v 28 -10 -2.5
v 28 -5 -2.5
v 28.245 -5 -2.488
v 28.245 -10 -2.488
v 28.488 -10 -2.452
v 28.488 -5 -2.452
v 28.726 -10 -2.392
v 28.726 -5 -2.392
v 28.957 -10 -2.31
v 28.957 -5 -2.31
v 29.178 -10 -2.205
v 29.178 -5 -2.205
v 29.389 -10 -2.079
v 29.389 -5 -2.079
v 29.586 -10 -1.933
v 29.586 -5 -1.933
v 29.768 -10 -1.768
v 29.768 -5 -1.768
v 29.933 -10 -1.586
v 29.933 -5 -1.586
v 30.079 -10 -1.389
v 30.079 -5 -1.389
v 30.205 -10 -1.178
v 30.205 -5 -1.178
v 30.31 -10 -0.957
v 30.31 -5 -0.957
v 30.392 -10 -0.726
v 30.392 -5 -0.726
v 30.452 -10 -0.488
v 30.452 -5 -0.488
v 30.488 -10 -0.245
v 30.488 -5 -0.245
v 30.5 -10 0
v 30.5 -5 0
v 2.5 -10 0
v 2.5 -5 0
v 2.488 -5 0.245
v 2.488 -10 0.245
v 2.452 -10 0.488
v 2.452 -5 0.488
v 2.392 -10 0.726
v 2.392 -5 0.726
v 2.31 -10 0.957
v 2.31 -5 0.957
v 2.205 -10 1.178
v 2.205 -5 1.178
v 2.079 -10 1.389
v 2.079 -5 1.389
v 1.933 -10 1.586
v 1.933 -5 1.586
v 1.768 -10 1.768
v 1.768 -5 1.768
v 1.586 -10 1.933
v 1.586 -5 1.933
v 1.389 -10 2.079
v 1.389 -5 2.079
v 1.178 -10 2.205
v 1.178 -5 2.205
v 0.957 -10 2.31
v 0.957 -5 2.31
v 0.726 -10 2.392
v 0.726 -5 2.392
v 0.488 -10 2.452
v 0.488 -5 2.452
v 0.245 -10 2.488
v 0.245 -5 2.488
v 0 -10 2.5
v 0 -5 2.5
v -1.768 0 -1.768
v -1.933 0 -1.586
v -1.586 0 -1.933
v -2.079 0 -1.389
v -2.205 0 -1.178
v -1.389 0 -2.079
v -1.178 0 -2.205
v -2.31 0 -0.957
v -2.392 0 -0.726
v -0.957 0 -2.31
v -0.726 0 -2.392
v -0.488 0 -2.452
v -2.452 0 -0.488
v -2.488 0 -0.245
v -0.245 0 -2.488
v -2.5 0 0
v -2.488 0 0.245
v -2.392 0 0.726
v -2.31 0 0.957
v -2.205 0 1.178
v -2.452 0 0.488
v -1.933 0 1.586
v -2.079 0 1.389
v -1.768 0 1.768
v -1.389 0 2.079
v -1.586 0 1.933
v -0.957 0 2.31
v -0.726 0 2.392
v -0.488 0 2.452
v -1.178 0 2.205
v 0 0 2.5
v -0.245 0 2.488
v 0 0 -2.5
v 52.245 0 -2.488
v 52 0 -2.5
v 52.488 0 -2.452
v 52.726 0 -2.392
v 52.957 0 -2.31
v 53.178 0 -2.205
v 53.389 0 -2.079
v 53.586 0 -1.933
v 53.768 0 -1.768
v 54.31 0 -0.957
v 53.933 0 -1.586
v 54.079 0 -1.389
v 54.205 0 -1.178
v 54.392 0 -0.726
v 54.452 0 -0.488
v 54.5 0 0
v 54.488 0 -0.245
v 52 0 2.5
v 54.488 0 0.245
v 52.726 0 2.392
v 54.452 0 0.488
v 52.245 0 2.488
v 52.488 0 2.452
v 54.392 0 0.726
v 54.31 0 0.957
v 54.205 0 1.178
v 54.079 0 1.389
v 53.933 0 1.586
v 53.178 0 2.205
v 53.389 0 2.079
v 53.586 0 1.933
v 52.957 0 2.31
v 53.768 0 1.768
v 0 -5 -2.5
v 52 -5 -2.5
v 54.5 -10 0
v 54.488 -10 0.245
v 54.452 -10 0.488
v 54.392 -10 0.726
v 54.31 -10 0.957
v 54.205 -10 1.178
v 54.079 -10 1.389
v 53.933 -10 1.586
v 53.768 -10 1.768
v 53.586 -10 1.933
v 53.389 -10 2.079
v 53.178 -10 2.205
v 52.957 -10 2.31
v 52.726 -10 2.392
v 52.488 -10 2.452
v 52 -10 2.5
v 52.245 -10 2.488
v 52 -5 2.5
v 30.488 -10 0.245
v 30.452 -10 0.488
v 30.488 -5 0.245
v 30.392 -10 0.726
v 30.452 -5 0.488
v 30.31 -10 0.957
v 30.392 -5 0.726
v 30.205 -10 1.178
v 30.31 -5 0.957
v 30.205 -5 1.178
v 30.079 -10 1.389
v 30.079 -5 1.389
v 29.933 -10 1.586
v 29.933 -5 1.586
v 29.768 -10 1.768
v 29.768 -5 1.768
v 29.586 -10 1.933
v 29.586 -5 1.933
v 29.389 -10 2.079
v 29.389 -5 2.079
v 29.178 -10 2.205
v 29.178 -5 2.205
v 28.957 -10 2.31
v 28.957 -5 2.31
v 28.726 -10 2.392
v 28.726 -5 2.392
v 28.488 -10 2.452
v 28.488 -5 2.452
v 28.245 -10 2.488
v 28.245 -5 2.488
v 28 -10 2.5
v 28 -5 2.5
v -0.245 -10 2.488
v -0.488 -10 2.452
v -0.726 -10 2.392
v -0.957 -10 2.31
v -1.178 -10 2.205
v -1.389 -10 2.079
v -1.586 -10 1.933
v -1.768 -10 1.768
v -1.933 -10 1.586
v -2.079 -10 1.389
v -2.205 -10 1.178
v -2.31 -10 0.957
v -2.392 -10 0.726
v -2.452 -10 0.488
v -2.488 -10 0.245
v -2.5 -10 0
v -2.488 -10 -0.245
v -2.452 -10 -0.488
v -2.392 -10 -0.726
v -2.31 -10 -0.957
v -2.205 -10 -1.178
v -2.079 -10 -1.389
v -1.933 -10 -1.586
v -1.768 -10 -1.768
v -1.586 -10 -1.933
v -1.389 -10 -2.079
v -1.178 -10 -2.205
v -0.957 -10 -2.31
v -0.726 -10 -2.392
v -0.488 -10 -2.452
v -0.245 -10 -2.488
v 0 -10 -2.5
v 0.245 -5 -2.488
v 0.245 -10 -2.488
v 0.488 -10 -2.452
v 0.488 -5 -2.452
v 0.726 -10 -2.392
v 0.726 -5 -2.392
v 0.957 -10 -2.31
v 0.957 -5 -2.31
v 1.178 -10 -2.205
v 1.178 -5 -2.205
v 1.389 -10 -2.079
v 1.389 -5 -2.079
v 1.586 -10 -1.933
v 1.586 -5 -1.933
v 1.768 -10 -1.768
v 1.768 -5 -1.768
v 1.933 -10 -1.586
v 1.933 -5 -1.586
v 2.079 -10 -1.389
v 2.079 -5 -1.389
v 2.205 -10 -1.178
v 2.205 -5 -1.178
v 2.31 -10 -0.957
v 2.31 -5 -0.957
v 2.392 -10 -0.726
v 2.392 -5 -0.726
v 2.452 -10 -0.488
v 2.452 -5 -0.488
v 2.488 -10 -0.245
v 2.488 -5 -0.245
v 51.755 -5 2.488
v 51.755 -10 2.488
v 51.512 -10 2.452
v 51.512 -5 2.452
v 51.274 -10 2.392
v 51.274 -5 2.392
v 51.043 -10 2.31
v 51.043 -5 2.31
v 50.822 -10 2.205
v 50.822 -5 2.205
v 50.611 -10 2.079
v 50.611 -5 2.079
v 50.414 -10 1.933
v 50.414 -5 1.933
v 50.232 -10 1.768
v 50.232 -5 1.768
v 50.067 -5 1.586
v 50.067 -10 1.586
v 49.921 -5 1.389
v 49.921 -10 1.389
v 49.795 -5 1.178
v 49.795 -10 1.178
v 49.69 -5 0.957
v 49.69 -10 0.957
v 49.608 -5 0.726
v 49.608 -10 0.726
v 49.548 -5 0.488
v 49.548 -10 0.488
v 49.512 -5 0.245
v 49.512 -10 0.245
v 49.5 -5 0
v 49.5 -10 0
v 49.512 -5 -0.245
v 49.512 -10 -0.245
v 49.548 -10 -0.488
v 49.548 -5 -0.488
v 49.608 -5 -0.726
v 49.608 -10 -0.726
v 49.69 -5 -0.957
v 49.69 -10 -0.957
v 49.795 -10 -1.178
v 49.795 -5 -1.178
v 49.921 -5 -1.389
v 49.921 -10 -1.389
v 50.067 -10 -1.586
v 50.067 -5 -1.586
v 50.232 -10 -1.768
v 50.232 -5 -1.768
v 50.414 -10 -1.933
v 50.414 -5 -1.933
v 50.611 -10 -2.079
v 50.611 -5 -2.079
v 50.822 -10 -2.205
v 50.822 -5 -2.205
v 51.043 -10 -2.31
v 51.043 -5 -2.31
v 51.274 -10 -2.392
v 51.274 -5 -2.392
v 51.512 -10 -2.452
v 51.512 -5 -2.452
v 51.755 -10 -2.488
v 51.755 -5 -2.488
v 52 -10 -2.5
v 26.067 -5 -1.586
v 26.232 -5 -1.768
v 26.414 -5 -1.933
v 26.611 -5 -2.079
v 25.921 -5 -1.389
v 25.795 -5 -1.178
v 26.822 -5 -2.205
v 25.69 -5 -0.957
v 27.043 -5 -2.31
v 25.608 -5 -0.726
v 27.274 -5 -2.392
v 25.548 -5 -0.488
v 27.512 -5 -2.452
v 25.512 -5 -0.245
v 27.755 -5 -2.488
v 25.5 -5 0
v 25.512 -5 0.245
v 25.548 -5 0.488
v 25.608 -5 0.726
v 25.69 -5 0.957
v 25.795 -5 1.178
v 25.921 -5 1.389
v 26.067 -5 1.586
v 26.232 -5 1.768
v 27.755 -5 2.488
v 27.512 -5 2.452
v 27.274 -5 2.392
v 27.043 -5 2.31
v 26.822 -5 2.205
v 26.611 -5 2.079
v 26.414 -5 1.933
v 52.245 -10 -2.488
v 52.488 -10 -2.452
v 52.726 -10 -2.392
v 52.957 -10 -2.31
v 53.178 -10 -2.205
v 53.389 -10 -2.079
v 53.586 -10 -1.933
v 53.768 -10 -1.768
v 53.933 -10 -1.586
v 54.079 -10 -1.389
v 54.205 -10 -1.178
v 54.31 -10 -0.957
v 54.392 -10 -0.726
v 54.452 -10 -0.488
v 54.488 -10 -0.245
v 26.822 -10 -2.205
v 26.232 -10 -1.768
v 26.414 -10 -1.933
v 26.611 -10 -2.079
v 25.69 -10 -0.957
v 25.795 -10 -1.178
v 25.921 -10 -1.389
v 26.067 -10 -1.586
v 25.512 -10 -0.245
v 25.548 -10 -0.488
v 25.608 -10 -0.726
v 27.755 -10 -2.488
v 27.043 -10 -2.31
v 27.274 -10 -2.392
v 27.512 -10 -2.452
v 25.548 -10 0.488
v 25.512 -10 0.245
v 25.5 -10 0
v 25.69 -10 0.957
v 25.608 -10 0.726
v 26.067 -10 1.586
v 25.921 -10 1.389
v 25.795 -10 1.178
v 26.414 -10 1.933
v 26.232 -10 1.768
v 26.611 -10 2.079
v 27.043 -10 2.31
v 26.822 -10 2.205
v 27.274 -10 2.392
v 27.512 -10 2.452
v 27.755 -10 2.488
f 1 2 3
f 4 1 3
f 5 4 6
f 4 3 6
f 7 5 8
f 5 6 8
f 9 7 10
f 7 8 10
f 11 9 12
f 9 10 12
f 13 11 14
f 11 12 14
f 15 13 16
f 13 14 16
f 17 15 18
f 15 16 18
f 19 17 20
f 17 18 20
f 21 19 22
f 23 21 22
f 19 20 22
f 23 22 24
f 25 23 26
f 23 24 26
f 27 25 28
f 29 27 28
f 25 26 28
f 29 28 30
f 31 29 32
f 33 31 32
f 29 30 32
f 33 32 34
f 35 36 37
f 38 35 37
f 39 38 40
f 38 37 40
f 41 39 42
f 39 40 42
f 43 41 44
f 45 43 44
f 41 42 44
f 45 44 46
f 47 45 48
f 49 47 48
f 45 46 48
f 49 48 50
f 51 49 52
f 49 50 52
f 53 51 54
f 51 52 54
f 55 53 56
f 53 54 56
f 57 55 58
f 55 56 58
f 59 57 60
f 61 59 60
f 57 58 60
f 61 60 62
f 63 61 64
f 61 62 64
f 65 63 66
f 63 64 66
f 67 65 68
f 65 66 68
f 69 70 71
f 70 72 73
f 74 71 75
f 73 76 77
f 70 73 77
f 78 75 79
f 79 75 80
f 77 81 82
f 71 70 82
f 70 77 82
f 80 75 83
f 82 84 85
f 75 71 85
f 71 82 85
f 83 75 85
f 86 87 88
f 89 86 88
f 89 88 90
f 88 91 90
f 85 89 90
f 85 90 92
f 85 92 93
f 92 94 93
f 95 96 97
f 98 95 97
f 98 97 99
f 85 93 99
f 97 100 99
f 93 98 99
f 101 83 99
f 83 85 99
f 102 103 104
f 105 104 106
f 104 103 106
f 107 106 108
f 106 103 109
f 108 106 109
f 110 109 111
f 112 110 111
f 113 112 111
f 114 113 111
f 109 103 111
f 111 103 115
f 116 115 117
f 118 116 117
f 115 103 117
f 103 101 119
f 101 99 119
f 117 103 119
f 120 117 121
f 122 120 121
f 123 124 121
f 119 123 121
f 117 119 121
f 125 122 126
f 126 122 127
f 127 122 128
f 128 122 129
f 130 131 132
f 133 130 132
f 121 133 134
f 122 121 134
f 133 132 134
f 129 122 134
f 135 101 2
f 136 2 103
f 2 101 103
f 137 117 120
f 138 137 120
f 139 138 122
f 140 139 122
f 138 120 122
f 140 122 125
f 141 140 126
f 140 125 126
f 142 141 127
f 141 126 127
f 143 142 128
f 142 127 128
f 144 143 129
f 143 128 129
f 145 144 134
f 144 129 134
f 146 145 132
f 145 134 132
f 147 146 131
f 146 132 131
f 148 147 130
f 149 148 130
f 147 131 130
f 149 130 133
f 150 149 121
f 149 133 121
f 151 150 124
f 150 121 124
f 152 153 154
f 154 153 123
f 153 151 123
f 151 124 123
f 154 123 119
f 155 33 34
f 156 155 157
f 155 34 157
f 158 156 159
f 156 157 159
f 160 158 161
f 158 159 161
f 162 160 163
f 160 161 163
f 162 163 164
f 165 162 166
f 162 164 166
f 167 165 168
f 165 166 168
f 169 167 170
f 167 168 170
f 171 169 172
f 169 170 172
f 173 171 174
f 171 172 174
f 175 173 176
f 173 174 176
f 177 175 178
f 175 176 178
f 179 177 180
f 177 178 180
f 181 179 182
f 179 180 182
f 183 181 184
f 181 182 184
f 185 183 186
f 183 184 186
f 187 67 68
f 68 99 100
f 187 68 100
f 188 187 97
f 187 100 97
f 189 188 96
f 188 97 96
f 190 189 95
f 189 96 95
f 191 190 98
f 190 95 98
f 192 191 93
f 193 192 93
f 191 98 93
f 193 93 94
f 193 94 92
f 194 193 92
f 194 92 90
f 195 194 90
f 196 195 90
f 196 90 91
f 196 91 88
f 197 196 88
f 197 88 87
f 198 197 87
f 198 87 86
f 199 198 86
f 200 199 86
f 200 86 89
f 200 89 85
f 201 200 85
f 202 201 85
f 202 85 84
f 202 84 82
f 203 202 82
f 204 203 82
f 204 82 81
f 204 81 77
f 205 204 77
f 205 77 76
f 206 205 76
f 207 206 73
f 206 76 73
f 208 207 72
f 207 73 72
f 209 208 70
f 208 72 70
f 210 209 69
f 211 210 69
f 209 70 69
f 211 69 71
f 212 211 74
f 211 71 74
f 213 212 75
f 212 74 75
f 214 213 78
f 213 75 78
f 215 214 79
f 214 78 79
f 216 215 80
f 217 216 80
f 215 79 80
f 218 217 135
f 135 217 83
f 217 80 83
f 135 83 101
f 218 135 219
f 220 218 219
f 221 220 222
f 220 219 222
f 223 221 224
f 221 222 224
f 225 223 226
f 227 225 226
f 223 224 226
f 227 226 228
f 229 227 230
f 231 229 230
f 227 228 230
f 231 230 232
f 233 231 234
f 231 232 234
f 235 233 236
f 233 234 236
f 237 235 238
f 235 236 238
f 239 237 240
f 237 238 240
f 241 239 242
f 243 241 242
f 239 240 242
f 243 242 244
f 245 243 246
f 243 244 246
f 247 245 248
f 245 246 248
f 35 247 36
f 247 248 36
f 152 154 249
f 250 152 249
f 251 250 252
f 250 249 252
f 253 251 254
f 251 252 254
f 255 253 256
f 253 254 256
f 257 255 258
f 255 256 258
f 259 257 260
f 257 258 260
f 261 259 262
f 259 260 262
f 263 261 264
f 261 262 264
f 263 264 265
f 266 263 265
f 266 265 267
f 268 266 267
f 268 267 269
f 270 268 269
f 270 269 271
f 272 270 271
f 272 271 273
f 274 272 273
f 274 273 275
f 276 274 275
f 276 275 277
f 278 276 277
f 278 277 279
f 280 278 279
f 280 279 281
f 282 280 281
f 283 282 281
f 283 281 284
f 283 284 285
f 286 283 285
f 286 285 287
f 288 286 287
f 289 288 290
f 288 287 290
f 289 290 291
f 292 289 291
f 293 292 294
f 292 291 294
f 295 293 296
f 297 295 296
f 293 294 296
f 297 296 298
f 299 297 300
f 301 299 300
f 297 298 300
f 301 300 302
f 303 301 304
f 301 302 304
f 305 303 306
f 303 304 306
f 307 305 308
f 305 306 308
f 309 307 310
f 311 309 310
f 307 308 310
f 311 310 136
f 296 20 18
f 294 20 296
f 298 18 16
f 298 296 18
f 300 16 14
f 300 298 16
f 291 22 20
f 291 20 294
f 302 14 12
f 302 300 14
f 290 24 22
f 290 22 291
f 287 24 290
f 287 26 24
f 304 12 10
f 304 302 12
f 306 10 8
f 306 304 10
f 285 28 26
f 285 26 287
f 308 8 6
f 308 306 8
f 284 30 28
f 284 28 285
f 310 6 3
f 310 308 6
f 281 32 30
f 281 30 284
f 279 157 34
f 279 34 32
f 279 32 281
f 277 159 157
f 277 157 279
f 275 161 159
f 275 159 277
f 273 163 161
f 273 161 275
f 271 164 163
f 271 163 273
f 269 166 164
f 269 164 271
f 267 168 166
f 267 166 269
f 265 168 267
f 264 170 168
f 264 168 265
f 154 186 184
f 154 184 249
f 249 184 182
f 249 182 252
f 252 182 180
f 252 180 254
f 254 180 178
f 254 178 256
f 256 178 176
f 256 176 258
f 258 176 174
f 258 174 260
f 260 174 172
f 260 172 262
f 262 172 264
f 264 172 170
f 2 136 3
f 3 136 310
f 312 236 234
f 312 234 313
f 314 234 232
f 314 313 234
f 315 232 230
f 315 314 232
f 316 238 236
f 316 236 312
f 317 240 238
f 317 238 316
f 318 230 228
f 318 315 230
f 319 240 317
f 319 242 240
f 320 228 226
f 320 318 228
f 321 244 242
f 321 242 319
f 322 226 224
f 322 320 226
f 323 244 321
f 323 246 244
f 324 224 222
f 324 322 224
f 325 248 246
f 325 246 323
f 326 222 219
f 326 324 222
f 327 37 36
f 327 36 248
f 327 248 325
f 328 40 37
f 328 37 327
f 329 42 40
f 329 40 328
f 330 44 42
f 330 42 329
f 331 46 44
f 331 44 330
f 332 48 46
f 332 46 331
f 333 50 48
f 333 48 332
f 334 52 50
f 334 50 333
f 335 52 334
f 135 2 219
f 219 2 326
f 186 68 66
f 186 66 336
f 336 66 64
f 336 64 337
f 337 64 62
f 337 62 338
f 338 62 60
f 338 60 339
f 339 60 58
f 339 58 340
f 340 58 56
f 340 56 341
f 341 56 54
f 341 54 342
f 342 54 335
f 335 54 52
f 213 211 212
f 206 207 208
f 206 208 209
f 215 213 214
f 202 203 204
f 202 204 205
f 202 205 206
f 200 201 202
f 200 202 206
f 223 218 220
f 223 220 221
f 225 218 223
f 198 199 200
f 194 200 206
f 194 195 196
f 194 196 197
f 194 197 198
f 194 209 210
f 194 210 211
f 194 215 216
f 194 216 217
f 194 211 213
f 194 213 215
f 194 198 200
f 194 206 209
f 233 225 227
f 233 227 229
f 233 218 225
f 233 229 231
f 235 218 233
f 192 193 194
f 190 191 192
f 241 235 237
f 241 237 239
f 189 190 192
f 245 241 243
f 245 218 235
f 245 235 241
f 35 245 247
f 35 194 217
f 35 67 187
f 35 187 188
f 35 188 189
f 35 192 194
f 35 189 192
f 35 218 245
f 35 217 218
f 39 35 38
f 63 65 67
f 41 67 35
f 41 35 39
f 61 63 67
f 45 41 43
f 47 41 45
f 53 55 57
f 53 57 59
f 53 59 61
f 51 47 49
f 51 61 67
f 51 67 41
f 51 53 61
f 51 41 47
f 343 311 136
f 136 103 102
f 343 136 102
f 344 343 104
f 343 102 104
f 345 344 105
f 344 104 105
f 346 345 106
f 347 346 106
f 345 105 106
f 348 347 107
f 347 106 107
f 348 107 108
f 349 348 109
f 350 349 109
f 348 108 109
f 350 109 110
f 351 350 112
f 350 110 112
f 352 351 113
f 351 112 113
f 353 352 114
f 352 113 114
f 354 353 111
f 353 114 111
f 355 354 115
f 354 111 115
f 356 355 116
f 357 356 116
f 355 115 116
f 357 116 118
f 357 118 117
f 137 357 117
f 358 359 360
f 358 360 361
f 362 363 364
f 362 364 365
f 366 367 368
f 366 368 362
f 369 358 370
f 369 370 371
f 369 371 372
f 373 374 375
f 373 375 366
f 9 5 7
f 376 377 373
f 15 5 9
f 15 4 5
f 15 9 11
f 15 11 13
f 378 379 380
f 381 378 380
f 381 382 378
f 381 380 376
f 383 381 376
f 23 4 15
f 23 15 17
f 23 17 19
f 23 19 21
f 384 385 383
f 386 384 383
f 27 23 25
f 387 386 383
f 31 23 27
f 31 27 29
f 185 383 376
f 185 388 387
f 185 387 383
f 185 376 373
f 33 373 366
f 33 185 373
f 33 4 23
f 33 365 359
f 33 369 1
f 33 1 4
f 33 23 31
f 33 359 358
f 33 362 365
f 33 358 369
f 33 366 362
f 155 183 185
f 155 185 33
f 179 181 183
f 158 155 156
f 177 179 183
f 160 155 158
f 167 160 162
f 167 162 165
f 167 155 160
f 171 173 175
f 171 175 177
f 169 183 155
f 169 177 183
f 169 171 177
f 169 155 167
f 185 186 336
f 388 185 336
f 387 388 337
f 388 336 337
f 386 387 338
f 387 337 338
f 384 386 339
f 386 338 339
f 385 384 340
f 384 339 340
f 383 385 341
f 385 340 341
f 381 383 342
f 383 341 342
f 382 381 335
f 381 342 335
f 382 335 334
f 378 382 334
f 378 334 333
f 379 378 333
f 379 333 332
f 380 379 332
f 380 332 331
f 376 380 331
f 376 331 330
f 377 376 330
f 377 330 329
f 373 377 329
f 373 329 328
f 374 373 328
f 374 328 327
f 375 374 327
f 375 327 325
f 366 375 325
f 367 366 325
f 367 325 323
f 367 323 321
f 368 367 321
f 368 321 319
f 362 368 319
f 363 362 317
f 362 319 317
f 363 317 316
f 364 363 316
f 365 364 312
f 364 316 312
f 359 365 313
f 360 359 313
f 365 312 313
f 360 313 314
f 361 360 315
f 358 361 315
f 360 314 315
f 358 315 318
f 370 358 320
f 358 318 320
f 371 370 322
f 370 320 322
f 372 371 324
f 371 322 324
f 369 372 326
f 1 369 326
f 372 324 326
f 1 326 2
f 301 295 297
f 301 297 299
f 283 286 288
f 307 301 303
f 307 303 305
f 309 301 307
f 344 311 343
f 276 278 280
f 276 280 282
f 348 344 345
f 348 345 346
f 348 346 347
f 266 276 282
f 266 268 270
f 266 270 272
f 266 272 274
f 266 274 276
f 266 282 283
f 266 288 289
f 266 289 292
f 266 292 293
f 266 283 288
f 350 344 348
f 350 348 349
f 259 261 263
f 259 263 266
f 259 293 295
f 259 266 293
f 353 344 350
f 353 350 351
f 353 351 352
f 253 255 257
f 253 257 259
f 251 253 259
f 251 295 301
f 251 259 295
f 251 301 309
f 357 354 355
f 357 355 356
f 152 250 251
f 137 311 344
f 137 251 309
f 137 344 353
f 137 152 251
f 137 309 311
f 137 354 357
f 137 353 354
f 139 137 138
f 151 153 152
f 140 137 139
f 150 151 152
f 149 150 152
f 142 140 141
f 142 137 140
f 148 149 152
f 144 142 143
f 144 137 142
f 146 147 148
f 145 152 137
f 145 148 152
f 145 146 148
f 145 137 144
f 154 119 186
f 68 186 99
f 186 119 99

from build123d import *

# Parameters (mm, degrees)
F1_DEPTH = 10
F2_DEPTH = 5


with BuildPart() as f1:
    # F0 (on Front) → F1 (new body)
    with BuildSketch(Plane.XZ):
        with BuildLine():
            ThreePointArc((0, -2.5), (1.767767, -1.767767), (2.5, 0))
            ThreePointArc((2.5, 0), (1.767767, 1.767767), (0, 2.5))
            Line((0, 2.5), (0, -2.5))
        make_face()
        with BuildLine():
            ThreePointArc((30.5, 0), (29.767767, 1.767767), (28, 2.5))
            ThreePointArc((28, 2.5), (25.5, 0), (28, -2.5))
            ThreePointArc((28, -2.5), (29.767767, -1.767767), (30.5, 0))
        make_face()
        with BuildLine():
            ThreePointArc((54.5, 0), (53.767767, 1.767767), (52, 2.5))
            Line((52, 2.5), (52, -2.5))
            ThreePointArc((52, -2.5), (53.767767, -1.767767), (54.5, 0))
        make_face()
        with BuildLine():
            Line((52, -2.5), (52, 2.5))
            ThreePointArc((52, 2.5), (49.5, 0), (52, -2.5))
        make_face()
        with BuildLine():
            Line((0, -2.5), (0, 2.5))
            ThreePointArc((0, 2.5), (-2.5, 0), (0, -2.5))
        make_face()
    extrude(amount=F1_DEPTH)

    # F0 (on Front) → F2 (join)
    with BuildSketch(Plane.XZ):
        with BuildLine():
            ThreePointArc((0, 2.5), (1.767767, 1.767767), (2.5, 0))
            ThreePointArc((2.5, 0), (1.767767, -1.767767), (0, -2.5))
            Line((0, -2.5), (28, -2.5))
            ThreePointArc((28, -2.5), (25.5, 0), (28, 2.5))
            Line((28, 2.5), (0, 2.5))
        make_face()
        with BuildLine():
            Line((0, -2.5), (0, 2.5))
            ThreePointArc((0, 2.5), (-2.5, 0), (0, -2.5))
        make_face()
        with BuildLine():
            Line((52, 2.5), (28, 2.5))
            ThreePointArc((28, 2.5), (29.767767, 1.767767), (30.5, 0))
            ThreePointArc((30.5, 0), (29.767767, -1.767767), (28, -2.5))
            Line((28, -2.5), (52, -2.5))
            ThreePointArc((52, -2.5), (49.5, 0), (52, 2.5))
        make_face()
        with BuildLine():
            ThreePointArc((54.5, 0), (53.767767, 1.767767), (52, 2.5))
            Line((52, 2.5), (52, -2.5))
            ThreePointArc((52, -2.5), (53.767767, -1.767767), (54.5, 0))
        make_face()
    extrude(amount=F2_DEPTH)


solid = f1.part
